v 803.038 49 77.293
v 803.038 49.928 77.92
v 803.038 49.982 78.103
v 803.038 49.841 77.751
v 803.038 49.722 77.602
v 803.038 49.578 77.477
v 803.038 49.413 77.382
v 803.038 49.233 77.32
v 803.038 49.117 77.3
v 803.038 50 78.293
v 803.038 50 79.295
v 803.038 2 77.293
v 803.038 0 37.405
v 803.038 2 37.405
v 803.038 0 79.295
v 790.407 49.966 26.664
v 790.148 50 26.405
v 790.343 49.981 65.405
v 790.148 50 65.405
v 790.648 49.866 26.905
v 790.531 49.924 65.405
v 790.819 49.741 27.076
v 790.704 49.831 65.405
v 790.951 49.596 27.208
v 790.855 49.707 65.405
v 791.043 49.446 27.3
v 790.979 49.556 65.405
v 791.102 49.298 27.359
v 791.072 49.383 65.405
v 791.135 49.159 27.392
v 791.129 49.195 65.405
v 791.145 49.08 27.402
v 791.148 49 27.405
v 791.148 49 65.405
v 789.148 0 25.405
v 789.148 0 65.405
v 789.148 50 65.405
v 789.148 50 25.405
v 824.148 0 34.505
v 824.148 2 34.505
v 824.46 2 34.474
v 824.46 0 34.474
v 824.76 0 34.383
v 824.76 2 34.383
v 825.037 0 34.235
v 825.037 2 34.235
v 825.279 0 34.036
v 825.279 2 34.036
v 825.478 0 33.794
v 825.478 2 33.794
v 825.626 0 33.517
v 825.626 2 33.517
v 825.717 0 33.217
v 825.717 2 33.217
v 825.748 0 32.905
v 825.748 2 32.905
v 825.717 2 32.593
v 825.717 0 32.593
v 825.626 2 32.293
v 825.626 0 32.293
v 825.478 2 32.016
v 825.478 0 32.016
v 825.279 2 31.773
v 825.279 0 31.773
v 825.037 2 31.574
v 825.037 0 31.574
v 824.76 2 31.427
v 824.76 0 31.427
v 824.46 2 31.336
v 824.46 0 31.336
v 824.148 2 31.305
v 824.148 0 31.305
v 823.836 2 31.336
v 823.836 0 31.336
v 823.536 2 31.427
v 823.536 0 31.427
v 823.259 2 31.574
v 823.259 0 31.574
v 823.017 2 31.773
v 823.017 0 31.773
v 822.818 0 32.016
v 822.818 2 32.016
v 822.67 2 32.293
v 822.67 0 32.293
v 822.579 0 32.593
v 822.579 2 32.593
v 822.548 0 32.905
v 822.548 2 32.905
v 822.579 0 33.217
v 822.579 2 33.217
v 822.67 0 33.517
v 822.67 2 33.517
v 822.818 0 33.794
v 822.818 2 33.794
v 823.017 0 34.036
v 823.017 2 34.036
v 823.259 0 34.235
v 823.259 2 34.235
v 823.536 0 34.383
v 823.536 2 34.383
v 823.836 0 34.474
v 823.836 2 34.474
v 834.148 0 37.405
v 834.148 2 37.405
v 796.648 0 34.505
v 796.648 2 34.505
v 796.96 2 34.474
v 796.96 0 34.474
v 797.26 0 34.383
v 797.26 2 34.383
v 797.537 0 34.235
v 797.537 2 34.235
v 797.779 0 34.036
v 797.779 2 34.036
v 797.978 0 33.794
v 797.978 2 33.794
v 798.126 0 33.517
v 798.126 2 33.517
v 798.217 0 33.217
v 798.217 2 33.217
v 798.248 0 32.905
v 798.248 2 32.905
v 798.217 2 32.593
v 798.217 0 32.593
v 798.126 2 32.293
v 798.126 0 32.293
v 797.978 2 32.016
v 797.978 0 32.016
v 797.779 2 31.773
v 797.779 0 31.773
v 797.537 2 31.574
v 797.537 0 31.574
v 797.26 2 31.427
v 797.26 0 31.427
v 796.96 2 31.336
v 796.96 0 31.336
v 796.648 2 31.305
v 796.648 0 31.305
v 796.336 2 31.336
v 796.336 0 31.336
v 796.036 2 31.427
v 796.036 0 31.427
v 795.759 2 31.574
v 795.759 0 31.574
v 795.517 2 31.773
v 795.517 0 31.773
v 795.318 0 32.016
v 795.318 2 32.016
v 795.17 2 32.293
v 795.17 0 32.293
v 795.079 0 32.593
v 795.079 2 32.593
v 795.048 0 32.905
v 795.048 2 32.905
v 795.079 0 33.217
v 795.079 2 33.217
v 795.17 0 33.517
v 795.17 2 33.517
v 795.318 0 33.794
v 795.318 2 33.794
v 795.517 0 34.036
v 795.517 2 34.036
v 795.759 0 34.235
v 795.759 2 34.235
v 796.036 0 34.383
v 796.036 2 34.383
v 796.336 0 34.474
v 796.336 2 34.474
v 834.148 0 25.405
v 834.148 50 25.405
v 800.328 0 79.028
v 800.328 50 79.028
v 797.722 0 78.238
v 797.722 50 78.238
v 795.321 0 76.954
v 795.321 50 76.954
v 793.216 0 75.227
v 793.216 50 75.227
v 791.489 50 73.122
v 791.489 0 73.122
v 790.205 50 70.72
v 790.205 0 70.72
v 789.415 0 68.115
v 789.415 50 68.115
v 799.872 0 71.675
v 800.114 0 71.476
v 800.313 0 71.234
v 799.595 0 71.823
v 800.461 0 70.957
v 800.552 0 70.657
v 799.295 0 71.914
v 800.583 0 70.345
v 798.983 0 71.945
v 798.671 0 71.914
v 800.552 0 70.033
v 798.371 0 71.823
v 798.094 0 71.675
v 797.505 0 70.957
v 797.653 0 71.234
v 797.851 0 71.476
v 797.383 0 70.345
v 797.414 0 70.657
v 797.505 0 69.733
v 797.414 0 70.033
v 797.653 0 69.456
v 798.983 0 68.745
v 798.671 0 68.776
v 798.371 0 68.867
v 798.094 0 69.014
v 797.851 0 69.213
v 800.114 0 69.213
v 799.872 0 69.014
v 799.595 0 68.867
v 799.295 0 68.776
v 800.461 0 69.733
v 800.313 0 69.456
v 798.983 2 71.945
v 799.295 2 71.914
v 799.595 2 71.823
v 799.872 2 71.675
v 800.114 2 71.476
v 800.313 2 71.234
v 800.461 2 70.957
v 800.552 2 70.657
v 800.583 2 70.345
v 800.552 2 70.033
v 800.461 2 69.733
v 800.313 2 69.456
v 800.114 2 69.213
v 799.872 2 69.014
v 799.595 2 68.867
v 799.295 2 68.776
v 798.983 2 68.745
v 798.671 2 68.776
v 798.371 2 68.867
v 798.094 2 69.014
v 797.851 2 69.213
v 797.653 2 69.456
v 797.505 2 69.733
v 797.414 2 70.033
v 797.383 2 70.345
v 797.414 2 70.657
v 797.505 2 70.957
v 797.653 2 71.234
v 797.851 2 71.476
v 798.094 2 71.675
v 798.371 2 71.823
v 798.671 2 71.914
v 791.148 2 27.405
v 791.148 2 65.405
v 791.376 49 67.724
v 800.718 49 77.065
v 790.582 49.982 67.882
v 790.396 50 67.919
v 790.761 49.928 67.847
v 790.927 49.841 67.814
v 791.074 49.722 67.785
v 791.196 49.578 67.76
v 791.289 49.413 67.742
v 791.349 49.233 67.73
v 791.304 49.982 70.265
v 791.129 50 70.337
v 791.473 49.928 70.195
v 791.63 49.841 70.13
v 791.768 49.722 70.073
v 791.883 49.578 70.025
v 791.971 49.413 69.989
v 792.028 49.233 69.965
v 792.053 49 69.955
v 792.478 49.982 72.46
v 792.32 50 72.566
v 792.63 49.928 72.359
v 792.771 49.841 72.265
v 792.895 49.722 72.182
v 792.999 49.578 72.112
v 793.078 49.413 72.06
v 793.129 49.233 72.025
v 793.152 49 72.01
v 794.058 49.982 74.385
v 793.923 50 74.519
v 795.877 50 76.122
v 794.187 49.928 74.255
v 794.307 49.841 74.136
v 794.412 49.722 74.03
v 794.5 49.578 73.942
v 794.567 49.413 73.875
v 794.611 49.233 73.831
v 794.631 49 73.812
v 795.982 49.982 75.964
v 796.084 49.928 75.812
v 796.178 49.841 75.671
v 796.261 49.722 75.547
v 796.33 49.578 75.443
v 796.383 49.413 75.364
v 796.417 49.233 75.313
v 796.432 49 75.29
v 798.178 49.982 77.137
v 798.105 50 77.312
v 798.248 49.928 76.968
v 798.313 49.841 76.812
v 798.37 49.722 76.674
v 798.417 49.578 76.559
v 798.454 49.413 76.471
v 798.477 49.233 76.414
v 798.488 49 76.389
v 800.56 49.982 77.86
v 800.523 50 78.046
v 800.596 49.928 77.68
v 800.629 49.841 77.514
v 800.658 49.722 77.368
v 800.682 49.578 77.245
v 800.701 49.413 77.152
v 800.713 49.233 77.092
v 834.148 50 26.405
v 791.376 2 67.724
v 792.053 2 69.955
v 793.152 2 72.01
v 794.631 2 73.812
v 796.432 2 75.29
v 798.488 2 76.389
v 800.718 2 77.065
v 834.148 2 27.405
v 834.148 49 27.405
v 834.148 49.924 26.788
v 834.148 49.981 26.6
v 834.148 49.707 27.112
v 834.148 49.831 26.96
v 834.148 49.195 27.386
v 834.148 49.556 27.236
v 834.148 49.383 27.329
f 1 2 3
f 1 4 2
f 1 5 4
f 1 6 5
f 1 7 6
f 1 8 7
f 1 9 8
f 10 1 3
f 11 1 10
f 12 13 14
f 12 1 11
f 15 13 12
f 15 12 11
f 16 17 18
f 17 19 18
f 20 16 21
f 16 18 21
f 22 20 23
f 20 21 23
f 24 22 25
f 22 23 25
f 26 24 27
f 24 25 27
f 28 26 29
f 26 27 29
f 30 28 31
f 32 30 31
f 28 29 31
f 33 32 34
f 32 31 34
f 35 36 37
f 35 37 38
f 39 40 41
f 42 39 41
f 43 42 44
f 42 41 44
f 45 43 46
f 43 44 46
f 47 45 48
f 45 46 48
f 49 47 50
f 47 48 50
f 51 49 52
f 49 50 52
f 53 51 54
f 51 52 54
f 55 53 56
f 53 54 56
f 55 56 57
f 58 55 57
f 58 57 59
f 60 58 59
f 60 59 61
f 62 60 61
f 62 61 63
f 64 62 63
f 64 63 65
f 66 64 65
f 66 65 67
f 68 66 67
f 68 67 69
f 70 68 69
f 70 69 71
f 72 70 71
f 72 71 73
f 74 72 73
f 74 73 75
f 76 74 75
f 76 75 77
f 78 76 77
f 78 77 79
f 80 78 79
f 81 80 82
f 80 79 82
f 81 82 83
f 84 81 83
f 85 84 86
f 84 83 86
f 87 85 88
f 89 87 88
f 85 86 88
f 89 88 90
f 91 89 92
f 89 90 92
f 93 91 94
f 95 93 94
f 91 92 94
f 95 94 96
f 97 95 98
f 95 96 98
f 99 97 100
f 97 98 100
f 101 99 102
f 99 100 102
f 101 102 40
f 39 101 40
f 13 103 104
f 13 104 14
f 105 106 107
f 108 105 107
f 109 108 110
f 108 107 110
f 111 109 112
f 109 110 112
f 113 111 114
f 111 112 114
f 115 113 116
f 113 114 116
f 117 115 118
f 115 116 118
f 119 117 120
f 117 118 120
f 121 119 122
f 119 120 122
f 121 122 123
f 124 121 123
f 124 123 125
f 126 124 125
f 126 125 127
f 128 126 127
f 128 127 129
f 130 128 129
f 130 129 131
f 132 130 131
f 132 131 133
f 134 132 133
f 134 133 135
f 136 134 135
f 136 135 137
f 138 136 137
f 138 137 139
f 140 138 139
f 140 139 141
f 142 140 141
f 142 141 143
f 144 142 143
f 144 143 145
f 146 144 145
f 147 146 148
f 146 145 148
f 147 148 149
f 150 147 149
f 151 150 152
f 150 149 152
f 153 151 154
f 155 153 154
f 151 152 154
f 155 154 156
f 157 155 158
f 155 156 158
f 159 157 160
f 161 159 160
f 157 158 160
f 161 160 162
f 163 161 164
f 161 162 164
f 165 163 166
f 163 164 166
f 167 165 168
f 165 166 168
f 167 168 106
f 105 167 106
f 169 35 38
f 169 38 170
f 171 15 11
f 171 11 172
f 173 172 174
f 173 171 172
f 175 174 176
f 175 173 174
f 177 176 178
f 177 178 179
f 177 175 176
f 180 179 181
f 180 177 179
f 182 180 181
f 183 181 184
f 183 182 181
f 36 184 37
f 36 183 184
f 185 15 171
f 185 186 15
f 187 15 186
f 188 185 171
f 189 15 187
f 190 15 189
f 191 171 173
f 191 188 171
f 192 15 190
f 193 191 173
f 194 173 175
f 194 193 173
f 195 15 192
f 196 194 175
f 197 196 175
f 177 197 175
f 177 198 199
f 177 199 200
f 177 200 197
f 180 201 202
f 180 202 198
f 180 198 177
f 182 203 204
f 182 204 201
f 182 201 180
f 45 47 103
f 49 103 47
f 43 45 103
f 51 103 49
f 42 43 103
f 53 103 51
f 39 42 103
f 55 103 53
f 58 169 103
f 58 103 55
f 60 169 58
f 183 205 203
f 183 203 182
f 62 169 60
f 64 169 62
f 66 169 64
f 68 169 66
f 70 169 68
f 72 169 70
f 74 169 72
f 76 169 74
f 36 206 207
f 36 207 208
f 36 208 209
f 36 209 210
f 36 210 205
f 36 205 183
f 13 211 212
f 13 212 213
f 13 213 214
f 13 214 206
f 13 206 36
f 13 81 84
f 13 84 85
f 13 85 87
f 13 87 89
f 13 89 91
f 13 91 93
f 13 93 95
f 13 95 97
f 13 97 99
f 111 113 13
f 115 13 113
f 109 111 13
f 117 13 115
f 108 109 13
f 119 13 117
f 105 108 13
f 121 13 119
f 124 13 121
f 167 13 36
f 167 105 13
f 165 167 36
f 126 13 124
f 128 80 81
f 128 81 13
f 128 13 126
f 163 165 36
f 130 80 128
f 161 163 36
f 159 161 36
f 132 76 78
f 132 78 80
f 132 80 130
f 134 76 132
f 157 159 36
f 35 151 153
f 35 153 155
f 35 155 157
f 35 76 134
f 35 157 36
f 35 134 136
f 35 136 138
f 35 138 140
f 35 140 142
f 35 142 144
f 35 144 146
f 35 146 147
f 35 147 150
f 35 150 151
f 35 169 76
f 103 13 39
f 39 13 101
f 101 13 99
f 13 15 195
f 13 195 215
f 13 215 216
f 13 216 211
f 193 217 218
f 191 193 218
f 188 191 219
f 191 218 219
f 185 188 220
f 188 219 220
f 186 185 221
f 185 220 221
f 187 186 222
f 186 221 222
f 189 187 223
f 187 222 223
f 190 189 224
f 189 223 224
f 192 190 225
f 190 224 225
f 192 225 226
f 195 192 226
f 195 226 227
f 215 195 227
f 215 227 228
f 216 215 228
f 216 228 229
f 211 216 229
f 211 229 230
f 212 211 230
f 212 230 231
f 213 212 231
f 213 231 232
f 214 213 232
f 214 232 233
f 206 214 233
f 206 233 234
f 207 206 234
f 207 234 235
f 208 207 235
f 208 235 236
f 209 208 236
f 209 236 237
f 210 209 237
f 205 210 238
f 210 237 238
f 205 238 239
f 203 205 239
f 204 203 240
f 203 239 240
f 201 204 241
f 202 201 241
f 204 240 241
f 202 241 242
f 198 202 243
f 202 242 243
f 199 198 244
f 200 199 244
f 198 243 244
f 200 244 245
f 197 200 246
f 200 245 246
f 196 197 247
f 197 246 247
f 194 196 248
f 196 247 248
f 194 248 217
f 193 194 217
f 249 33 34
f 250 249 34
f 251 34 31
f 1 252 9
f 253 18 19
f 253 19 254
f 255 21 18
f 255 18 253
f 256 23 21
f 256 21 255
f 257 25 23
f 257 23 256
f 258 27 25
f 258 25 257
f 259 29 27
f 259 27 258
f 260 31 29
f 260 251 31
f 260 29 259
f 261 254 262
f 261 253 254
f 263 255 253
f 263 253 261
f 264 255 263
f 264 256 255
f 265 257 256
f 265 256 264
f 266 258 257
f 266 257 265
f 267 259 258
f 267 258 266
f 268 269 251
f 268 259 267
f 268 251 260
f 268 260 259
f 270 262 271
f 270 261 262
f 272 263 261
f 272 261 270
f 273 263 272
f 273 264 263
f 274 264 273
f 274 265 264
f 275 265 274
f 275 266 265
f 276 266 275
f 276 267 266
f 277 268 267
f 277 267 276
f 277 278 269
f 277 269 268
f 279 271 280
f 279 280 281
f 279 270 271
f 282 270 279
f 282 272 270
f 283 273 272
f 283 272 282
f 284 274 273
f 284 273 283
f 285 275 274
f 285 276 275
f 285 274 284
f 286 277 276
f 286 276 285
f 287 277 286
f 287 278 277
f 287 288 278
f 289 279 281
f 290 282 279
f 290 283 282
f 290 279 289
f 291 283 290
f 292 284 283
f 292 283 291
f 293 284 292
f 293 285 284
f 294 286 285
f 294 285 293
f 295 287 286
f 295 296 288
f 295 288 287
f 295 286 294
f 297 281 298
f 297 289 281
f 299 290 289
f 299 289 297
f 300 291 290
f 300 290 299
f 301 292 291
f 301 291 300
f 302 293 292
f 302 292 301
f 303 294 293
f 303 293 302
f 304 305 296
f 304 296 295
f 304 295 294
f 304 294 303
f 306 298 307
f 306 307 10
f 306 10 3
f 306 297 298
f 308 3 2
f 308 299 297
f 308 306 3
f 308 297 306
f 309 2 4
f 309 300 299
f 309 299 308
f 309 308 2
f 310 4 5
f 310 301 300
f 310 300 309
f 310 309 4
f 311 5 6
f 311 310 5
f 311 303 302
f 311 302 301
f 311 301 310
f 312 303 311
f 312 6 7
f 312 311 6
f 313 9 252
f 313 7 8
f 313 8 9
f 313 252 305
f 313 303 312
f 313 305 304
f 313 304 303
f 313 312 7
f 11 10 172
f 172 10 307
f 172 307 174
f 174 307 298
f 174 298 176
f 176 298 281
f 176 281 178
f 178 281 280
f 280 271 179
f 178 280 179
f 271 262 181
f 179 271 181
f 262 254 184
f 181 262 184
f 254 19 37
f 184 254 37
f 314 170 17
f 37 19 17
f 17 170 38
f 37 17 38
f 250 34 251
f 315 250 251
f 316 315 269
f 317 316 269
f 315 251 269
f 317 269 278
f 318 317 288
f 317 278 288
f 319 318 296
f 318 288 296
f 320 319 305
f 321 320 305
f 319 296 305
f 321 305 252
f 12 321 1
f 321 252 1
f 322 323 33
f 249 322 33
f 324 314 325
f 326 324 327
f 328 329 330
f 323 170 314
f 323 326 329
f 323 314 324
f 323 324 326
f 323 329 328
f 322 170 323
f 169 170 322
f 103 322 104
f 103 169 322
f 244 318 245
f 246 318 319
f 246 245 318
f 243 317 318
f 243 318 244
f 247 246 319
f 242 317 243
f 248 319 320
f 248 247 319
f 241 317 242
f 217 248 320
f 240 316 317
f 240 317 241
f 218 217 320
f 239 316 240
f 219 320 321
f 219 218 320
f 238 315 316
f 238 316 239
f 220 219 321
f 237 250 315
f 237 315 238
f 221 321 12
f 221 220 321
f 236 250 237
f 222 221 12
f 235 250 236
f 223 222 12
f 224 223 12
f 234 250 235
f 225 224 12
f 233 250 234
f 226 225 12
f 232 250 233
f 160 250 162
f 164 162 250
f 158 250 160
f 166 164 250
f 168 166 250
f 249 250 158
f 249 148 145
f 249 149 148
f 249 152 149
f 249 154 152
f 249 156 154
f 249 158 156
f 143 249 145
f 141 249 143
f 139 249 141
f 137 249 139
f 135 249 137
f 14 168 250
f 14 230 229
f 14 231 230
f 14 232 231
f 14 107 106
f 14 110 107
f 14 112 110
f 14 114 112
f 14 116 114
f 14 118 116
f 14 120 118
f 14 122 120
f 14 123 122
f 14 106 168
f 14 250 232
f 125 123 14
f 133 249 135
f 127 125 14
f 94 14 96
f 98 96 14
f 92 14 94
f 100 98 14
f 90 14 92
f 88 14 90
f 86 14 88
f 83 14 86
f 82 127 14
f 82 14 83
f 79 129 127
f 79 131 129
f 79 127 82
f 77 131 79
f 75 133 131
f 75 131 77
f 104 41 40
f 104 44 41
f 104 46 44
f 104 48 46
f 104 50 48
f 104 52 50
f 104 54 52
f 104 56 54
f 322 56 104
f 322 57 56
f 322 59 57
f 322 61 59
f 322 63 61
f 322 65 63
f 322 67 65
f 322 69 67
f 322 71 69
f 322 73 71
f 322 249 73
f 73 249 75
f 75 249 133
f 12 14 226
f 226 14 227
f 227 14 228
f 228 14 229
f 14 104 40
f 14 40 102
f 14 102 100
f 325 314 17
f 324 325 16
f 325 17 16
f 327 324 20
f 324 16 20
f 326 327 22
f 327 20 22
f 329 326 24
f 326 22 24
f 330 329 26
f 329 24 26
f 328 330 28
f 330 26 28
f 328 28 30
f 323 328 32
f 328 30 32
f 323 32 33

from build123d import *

# Parameters (mm, degrees)
BOSS_EXTRUDE1_DEPTH = 50
CUT_EXTRUDE1_DEPTH  = 48
SKETCH3_R           = 1.6
CUT_EXTRUDE2_DEPTH  = 840.282109633
FILLET3_R           = 1


with BuildPart() as part:
    # Sketch1 → Boss-Extrude1 (new body)
    with BuildSketch(Plane(origin=(0, 0, 0), x_dir=(1, 0, 0), z_dir=(0, 1, 0))):
        with BuildLine():
            Line((789.147942738, -65.404824394), (789.147942738, -25.404824394))
            Line((789.147942738, -25.404824394), (834.147942738, -25.404824394))
            Line((834.147942738, -25.404824394), (834.147942738, -37.404824394))
            Line((834.147942738, -37.404824394), (803.037942738, -37.404824394))
            Line((803.037942738, -37.404824394), (803.037942738, -58.807263418))
            Line((803.037942738, -58.807263418), (803.037942738, -79.294824394))
            ThreePointArc((803.037942738, -79.294824394), (793.216229548, -75.226537585), (789.147942738, -65.404824394))
        make_face()
    extrude(amount=BOSS_EXTRUDE1_DEPTH)

    # Sketch2 → Cut-Extrude1 (cut)
    with BuildSketch(Plane(origin=(0, 50, 0), x_dir=(1, 0, 0), z_dir=(0, 1, 0))):
        with BuildLine():
            Line((834.147942738, -27.404824394), (791.147942738, -27.404824394))
            Line((791.147942738, -27.404824394), (791.147942738, -65.404824394))
            ThreePointArc((791.147942738, -65.404824394), (794.630556885, -73.81166102), (803.037942738, -77.292949065))
            Line((803.037942738, -77.292949065), (834.147942738, -63.276412727))
            Line((834.147942738, -63.276412727), (834.147942738, -27.404824394))
        make_face()
    extrude(amount=-CUT_EXTRUDE1_DEPTH, mode=Mode.SUBTRACT)

    # Sketch3 → Cut-Extrude2 (cut, through all)
    with BuildSketch(Plane(origin=(0, 2, 0), x_dir=(1, 0, 0), z_dir=(0, 1, 0))):
        with Locations(Location((824.147942738, -32.904824394, 0), (0, 0, 270))):
            Circle(SKETCH3_R)
        with Locations(Location((796.647942738, -32.904824394, 0), (0, 0, 270))):
            Circle(SKETCH3_R)
        with Locations(Location((798.982858952, -70.344824394, 0), (0, 0, 270))):
            Circle(SKETCH3_R)
    extrude(amount=-CUT_EXTRUDE2_DEPTH, mode=Mode.SUBTRACT)

    # Fillet3
    fillet3_edges = [part.edges().sort_by_distance(p)[0] for p in [
        (794.630556885, 50, 73.81166102),
        (812.647942738, 50, 27.404824394),
        (791.147942738, 50, 46.404824394),
    ]]
    fillet(fillet3_edges, radius=FILLET3_R)


solid = part.part
